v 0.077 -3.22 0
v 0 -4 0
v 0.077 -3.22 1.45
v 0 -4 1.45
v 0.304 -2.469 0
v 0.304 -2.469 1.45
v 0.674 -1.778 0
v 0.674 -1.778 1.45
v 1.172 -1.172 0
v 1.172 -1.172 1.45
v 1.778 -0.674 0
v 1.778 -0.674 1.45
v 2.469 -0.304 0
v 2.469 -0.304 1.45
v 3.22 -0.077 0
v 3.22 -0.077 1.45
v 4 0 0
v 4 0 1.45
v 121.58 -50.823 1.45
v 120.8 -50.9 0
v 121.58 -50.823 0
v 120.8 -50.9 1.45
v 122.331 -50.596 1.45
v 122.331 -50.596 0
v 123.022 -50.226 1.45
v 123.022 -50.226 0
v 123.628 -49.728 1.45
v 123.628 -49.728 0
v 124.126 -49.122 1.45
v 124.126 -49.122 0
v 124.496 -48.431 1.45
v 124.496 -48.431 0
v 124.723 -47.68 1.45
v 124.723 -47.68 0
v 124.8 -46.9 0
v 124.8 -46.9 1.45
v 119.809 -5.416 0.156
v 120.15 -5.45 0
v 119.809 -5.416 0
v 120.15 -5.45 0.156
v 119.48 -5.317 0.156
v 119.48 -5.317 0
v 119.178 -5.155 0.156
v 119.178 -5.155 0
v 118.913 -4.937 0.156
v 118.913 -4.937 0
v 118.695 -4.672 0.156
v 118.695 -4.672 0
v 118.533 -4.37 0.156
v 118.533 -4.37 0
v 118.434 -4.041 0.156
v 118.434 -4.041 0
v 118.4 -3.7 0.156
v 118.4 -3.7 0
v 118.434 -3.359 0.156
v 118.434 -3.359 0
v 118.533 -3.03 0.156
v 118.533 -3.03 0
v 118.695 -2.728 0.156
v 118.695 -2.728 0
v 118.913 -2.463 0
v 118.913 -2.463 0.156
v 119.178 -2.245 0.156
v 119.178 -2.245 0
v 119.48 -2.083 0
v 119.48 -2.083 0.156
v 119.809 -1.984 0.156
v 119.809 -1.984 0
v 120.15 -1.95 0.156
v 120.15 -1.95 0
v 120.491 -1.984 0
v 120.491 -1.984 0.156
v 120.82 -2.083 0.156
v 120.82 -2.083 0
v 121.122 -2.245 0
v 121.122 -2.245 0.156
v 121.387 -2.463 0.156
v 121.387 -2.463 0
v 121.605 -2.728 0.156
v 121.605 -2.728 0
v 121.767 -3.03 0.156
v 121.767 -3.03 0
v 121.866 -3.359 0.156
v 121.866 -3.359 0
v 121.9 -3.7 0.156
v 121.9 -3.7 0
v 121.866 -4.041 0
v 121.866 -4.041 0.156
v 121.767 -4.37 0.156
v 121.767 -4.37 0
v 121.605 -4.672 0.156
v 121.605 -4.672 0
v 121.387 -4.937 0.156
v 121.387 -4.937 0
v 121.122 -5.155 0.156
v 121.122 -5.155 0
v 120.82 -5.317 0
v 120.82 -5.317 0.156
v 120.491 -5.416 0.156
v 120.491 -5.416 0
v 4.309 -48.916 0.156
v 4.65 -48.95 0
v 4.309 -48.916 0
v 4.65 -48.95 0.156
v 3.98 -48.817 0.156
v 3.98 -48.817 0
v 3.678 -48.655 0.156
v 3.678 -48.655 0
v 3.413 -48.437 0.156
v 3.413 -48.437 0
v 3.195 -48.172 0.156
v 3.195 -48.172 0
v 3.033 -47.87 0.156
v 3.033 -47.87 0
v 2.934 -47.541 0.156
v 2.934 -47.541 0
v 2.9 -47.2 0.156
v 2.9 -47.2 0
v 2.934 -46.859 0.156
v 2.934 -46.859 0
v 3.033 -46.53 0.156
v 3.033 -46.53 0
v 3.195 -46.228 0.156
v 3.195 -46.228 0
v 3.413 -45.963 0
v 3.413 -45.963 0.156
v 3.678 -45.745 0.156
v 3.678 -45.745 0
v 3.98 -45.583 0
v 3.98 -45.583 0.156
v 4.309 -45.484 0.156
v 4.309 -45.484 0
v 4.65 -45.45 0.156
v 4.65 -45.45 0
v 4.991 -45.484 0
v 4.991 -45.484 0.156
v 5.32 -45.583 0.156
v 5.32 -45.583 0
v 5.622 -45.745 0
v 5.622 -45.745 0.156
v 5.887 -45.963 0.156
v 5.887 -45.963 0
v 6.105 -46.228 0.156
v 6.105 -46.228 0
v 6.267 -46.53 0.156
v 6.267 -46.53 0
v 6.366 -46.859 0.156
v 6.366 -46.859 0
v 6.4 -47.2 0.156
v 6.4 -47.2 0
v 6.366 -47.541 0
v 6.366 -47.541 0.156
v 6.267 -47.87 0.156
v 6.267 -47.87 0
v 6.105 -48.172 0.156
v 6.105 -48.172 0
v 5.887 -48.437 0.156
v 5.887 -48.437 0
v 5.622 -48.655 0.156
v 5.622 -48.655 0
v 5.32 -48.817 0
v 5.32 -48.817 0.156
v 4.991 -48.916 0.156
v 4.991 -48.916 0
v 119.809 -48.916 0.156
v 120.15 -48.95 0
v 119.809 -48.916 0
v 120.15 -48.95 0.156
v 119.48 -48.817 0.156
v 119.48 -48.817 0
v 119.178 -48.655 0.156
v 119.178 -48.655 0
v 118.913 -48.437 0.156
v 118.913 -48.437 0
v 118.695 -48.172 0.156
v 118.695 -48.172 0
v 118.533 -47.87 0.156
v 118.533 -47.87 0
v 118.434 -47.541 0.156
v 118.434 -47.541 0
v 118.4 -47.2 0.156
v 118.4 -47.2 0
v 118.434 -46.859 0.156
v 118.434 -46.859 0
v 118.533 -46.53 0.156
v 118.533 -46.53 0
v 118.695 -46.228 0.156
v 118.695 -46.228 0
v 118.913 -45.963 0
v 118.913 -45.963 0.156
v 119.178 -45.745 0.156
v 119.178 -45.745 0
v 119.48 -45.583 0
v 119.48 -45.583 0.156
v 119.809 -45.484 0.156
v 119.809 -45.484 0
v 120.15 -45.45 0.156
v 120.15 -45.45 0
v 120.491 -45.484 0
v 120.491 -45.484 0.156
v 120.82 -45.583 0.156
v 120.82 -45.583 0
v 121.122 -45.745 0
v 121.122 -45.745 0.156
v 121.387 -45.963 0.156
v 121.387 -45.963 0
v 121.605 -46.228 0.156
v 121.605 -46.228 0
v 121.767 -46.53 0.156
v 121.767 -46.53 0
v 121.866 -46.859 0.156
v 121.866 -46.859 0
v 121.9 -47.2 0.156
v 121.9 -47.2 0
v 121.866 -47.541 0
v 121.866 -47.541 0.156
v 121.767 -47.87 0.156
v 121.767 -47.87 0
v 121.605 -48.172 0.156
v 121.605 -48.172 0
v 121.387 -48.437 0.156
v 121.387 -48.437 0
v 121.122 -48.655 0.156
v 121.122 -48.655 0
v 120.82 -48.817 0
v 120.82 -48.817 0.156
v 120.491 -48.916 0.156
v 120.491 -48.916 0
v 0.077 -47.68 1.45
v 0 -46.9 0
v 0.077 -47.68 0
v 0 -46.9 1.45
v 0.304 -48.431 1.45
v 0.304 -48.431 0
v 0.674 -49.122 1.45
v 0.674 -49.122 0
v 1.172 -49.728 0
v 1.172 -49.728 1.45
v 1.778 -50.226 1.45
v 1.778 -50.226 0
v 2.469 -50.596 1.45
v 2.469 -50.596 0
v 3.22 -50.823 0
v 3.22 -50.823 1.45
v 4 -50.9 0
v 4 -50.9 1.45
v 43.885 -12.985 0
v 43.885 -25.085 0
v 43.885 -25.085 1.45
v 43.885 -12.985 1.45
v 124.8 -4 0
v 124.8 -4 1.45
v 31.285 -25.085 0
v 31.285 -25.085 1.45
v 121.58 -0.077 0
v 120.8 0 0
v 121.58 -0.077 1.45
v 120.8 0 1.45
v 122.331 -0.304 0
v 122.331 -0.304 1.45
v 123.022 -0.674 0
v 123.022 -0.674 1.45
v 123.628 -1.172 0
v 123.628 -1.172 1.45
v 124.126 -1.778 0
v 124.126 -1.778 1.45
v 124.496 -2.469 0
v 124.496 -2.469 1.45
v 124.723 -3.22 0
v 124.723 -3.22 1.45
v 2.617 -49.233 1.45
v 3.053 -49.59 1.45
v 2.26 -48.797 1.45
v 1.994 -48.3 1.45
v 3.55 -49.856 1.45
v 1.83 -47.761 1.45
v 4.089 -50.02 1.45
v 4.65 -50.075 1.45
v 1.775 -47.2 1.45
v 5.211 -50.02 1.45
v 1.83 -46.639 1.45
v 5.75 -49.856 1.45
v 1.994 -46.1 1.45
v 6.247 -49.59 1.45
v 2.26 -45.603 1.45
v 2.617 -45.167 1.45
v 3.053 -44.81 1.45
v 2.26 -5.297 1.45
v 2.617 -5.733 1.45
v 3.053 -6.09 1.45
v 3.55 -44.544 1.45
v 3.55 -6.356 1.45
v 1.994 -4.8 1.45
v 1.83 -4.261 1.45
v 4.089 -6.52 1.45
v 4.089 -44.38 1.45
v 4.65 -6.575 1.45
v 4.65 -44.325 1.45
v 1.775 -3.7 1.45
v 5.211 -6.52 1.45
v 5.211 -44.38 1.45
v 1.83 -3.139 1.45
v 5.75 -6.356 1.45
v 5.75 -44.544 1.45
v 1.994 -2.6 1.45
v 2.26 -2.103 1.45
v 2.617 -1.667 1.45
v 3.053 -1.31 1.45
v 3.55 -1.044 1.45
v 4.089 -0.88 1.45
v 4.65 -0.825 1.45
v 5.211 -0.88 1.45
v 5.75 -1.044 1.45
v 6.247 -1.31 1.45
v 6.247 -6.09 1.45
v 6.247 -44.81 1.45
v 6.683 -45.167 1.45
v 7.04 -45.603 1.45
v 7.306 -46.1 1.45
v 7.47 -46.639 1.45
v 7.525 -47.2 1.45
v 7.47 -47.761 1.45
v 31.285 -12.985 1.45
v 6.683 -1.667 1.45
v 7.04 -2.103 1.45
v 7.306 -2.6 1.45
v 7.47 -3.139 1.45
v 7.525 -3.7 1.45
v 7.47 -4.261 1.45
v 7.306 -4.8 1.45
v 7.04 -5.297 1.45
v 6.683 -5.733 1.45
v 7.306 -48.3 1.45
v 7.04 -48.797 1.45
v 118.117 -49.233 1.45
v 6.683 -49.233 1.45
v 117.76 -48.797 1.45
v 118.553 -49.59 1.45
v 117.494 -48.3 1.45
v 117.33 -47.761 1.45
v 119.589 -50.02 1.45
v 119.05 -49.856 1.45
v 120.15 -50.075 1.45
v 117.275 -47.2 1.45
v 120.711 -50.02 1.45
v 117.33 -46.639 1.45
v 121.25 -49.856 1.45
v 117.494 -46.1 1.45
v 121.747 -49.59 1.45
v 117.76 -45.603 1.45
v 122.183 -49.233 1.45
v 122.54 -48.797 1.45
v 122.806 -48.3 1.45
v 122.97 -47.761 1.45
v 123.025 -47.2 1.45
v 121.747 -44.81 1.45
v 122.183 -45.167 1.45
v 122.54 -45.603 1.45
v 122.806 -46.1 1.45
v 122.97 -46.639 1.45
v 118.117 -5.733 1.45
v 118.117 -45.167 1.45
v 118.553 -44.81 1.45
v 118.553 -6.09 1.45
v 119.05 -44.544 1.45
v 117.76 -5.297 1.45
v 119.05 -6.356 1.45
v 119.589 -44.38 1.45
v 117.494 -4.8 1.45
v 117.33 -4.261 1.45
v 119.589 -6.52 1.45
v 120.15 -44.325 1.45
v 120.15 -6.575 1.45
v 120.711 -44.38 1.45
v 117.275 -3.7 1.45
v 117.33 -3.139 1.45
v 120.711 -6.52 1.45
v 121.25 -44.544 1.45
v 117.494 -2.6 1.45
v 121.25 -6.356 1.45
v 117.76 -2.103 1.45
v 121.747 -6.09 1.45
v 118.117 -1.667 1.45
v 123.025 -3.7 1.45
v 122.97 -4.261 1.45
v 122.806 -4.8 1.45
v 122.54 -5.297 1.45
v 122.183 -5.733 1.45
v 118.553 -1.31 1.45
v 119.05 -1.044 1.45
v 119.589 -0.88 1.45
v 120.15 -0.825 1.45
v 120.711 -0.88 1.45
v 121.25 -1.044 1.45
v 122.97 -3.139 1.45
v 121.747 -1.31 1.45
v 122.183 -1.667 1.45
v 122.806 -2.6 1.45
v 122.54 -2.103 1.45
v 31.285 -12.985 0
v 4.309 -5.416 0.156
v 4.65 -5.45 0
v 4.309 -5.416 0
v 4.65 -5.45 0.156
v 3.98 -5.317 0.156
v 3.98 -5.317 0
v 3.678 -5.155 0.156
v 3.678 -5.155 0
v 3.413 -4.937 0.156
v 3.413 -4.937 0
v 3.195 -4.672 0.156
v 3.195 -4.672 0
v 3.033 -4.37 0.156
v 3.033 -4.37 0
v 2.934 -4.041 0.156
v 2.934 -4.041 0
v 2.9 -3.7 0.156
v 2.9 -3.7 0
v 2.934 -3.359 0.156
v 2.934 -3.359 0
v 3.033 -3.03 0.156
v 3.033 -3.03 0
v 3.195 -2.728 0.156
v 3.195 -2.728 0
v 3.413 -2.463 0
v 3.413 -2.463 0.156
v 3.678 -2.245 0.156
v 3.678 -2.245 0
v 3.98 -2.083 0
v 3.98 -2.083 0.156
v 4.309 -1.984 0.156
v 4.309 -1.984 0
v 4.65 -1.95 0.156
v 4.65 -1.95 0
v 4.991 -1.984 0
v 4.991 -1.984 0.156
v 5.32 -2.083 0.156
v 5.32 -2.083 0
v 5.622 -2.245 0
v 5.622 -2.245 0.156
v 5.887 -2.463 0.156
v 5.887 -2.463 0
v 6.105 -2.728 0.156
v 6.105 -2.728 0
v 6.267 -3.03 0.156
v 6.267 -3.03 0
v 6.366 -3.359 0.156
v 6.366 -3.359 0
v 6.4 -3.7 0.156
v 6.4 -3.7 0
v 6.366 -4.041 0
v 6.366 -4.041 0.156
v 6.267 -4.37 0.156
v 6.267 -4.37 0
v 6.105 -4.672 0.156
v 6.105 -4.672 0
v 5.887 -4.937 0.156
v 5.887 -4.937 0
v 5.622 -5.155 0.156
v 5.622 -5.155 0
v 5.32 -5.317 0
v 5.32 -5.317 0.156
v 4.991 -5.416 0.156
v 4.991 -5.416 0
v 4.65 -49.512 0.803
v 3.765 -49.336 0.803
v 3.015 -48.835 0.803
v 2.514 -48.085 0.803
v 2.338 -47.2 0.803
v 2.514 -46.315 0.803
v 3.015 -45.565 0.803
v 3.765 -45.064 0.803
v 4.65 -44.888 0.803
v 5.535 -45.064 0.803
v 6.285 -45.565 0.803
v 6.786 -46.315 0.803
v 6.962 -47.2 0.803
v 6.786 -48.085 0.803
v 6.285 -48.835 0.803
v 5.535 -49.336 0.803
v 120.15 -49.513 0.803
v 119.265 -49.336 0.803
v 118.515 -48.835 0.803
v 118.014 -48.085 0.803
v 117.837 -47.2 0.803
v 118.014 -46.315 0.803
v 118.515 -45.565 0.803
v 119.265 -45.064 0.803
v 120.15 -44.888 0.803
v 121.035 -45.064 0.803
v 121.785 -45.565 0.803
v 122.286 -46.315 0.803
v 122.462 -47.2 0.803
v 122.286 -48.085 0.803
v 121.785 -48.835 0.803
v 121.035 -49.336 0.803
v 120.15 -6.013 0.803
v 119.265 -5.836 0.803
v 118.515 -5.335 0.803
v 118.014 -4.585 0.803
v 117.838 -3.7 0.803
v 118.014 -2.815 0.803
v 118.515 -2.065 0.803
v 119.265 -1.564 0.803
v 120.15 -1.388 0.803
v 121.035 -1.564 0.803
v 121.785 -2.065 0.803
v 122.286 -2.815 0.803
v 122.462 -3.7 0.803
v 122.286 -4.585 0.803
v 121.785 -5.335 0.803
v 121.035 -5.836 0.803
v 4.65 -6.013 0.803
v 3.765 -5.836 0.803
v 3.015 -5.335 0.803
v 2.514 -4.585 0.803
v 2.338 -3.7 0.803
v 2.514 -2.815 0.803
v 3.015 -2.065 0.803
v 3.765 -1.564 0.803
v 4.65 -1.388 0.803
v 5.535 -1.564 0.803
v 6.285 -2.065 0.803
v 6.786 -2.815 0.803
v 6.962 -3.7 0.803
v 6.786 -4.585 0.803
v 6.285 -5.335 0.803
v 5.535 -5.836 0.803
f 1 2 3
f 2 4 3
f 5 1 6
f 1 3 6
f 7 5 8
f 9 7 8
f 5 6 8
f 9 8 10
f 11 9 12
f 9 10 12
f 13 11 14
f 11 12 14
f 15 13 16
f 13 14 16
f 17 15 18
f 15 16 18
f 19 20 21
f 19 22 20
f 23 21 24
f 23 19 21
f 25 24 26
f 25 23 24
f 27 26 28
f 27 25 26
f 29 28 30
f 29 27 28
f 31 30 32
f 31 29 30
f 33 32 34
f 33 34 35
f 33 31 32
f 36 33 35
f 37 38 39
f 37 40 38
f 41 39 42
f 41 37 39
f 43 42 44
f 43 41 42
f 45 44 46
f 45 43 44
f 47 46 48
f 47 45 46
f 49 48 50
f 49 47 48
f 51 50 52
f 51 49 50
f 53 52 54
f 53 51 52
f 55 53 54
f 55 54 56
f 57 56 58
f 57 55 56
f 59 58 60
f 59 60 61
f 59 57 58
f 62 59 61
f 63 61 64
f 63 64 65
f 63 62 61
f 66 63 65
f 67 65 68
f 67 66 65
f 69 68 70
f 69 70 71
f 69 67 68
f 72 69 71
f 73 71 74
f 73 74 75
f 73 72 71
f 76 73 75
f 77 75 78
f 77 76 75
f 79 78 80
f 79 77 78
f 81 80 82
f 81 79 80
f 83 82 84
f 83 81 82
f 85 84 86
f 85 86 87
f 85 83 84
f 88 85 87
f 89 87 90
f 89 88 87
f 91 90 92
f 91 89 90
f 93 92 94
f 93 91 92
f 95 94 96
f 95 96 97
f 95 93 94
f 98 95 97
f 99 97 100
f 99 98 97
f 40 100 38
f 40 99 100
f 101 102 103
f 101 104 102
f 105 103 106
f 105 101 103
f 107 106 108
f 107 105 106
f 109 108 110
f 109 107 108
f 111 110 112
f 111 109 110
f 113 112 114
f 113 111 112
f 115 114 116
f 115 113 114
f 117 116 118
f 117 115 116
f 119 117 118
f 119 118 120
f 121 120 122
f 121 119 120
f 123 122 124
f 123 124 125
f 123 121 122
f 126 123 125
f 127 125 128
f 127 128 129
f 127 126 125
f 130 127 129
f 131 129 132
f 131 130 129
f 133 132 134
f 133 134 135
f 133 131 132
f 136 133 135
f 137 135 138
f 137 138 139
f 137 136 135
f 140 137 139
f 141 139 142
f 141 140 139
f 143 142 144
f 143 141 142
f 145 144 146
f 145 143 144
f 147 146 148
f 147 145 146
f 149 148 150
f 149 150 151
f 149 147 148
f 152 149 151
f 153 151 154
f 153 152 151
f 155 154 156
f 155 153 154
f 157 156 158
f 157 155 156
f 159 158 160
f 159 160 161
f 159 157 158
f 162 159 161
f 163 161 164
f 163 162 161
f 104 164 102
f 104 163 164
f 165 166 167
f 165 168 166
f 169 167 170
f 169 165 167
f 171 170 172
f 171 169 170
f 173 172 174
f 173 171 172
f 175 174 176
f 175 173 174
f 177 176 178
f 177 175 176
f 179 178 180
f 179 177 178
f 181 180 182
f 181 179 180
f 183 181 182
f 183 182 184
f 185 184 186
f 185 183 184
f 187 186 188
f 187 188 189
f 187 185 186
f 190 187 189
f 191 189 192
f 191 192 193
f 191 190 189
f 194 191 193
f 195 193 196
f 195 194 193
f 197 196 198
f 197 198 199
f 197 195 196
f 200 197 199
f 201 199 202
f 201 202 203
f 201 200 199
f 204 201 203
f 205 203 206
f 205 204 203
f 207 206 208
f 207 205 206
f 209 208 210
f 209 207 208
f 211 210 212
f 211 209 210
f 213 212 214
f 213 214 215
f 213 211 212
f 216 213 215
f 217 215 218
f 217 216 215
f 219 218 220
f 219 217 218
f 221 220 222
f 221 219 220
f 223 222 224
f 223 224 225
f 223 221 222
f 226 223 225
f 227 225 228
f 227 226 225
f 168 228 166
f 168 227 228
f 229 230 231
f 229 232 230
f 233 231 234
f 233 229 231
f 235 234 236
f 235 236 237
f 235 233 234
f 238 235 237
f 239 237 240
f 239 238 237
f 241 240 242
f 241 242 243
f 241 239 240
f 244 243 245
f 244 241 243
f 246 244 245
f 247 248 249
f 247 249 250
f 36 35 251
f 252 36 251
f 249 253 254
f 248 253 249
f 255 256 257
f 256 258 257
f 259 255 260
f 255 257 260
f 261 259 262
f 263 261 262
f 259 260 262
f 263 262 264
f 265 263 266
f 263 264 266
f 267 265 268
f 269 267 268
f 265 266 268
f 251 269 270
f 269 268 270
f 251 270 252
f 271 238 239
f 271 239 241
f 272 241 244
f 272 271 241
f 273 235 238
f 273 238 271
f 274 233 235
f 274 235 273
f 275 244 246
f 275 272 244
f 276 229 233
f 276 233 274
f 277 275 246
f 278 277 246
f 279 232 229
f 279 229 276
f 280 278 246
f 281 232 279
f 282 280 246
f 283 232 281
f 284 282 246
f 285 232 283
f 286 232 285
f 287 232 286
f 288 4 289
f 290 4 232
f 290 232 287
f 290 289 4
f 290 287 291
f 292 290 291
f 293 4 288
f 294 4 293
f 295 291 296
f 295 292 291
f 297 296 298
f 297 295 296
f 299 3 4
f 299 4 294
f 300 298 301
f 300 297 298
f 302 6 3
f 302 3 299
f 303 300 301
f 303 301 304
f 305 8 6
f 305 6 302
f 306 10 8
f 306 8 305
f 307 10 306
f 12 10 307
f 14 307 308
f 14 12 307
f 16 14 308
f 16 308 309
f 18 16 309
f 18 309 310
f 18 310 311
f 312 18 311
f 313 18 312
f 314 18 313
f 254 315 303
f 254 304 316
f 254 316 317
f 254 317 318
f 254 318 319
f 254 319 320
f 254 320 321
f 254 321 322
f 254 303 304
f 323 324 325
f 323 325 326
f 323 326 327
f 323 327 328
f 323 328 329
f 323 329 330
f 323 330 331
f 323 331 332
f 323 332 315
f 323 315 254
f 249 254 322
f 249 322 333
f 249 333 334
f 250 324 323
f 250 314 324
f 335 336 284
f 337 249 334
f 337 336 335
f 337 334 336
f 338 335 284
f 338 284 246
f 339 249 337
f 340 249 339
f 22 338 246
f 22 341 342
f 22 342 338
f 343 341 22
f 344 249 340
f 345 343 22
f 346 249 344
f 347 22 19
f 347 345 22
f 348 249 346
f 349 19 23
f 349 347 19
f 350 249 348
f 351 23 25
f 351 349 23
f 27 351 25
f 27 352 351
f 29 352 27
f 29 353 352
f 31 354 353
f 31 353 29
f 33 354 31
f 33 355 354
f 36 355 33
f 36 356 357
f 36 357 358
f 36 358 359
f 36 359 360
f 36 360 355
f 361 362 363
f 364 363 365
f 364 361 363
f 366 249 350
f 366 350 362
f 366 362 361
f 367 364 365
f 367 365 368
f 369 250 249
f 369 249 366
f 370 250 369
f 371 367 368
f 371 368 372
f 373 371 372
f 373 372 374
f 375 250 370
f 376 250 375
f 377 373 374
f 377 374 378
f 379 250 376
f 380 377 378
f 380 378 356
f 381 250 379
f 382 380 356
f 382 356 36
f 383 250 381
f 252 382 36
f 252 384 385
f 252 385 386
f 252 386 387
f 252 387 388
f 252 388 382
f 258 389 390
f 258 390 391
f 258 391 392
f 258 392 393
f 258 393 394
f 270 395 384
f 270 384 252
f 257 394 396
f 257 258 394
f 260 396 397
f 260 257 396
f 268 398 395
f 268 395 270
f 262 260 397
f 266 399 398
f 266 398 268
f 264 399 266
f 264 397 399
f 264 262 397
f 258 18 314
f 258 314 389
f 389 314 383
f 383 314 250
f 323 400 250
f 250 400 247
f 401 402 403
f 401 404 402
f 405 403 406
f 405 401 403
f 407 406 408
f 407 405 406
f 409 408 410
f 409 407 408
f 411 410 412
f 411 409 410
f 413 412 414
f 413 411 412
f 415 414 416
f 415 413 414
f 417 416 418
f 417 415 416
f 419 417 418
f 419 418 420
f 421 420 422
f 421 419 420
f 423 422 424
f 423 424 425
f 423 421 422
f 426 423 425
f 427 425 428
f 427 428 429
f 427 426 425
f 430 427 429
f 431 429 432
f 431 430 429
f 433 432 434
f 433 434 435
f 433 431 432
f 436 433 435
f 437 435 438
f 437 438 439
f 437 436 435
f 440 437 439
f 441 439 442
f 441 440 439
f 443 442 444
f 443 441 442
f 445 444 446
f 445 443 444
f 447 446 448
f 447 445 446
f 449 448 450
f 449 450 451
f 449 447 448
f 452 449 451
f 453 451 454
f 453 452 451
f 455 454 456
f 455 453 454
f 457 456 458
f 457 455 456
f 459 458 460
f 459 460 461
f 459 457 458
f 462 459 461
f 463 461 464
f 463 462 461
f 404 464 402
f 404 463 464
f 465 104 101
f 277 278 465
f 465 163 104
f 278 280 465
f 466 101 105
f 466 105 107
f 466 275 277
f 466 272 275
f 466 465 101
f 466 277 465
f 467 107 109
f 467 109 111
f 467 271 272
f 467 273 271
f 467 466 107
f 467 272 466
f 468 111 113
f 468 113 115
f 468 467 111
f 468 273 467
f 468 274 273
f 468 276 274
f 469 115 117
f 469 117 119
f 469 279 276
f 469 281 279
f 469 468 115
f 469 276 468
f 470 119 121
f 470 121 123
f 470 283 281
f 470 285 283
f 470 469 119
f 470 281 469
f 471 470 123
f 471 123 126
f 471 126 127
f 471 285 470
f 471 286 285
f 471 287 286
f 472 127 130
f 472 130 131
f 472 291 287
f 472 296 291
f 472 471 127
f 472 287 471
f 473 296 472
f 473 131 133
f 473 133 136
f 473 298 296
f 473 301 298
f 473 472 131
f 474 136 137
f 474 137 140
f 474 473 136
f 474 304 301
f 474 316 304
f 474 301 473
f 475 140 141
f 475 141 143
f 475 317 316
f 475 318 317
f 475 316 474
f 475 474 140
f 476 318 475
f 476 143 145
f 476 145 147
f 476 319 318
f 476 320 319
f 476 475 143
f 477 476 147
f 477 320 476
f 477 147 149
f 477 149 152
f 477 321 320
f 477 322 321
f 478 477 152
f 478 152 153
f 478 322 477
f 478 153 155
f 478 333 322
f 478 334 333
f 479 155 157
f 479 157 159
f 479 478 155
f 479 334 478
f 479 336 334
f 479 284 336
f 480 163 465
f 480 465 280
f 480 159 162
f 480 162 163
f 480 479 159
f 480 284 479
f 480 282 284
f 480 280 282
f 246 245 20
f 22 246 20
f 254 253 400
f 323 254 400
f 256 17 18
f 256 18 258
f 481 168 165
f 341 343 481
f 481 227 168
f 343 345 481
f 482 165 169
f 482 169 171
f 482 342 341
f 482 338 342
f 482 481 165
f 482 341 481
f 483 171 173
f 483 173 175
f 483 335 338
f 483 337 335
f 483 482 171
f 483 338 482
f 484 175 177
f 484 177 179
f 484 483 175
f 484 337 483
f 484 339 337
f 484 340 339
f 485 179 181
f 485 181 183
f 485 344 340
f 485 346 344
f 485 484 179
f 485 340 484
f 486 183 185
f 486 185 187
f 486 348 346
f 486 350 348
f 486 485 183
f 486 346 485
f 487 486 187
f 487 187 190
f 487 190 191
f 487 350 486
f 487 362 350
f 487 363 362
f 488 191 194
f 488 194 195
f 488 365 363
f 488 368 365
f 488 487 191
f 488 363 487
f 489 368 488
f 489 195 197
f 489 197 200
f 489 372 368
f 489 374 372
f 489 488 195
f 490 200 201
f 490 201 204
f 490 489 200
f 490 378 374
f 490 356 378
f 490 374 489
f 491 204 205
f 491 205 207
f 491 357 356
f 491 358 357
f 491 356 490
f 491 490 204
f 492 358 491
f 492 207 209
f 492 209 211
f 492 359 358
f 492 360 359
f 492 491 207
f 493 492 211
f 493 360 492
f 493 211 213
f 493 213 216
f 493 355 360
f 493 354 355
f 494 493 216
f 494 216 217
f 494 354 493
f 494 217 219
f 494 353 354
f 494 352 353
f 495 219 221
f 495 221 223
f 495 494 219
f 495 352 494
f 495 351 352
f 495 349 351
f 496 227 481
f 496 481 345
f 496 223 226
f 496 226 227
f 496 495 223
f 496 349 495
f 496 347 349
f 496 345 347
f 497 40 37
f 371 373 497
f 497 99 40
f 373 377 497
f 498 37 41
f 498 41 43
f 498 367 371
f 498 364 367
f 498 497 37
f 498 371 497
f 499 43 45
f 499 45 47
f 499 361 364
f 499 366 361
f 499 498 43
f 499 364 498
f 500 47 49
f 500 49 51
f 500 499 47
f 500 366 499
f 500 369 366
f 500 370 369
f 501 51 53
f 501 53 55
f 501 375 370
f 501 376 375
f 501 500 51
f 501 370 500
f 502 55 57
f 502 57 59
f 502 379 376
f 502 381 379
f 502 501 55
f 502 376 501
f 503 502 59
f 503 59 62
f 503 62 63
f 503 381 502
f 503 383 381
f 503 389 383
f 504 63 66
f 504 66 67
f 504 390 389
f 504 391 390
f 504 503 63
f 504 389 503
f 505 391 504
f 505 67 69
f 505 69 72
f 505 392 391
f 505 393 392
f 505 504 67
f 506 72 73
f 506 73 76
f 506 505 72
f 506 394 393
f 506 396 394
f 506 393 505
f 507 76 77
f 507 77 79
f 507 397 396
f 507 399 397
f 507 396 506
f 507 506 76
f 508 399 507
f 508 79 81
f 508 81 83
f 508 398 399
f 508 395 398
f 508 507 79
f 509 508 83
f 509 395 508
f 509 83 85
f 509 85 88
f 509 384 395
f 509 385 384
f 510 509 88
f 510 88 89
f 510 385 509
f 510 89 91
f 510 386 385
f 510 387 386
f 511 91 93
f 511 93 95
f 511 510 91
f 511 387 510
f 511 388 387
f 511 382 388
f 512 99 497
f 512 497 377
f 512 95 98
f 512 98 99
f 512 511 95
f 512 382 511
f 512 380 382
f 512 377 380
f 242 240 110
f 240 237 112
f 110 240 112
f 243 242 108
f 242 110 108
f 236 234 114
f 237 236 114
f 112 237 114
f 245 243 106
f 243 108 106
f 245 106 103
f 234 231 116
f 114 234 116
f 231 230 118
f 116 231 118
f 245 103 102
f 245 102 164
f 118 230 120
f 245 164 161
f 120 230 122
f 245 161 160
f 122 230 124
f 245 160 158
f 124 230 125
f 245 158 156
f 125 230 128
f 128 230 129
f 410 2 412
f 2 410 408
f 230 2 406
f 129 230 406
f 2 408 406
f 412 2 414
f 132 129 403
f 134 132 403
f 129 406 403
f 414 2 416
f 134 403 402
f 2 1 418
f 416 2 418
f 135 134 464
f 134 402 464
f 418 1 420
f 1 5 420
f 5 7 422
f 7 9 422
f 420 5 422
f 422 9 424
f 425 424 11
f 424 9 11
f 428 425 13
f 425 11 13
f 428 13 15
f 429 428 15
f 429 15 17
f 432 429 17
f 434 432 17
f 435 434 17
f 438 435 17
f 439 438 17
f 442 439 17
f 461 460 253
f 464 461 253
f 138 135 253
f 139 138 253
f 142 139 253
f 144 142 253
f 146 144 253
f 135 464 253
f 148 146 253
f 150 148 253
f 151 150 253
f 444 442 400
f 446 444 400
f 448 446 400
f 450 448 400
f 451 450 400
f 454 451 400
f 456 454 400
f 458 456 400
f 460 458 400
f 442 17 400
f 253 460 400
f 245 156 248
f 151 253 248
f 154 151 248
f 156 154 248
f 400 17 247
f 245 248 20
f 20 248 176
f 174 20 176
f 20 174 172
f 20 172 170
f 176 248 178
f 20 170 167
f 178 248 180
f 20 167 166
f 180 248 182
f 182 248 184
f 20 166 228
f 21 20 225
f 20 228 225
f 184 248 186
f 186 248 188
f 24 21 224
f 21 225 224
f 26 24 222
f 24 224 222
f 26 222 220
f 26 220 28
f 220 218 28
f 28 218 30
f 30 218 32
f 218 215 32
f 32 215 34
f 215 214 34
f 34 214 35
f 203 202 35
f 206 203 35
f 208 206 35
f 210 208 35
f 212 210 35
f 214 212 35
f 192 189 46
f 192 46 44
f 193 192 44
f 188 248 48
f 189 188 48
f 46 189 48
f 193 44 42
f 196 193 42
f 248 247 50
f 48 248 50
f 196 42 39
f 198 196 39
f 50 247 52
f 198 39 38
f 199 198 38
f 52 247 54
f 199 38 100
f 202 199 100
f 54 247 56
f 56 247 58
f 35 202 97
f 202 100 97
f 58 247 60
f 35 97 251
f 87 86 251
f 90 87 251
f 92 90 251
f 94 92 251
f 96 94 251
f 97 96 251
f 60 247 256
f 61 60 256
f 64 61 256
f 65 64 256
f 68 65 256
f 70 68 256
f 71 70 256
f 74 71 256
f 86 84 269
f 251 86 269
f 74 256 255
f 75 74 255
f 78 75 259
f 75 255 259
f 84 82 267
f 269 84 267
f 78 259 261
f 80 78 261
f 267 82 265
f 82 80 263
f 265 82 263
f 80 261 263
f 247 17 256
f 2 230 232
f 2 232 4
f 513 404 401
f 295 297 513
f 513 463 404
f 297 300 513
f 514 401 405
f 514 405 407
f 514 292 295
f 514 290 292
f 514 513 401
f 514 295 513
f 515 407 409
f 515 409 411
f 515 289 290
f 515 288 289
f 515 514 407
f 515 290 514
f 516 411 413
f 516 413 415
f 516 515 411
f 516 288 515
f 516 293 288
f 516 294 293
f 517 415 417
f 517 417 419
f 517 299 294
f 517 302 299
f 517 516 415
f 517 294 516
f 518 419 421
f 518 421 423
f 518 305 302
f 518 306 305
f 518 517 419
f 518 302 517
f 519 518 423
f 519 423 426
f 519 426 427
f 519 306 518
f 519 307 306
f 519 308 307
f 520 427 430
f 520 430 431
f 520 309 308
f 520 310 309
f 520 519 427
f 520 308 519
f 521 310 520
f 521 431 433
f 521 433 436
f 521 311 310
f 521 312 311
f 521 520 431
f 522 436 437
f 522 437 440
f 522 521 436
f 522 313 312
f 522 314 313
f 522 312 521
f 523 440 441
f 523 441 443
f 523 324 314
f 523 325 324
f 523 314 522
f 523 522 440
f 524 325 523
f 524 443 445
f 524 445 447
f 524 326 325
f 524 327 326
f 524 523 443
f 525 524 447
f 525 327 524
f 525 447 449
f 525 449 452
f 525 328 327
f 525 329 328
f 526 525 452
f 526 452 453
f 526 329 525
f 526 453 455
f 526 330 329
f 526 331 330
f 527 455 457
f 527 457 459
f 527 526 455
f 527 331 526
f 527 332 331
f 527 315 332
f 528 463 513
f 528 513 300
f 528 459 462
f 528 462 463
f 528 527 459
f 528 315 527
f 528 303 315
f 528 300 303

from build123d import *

# Parameters (mm, degrees)
SKETCH1_W                                      = 124.8
SKETCH1_H                                      = 50.9
SKETCH1_W_2                                    = 12.6
SKETCH1_H_2                                    = 12.1
BOSS_EXTRUDE1_DEPTH                            = 1.45
CSK_FOR_M3_5_FLAT_HEAD_MACHINE_SCREW1_AT_COUNT = 2
CSK_FOR_M3_5_FLAT_HEAD_MACHINE_SCREW1_AT_PITCH = 115.5
CSK_FOR_M3_5_FLAT_HEAD_MACHINE_SCREW_2_COUNT   = 2
CSK_FOR_M3_5_FLAT_HEAD_MACHINE_SCREW_2_PITCH   = 123.420014584
CSK_FOR_M3_5_FLAT_HEAD_MACHINE_SCREW_3_COUNT   = 2
CSK_FOR_M3_5_FLAT_HEAD_MACHINE_SCREW_3_PITCH   = 43.5
FILLET2_R                                      = 4


with BuildPart() as part:
    # Sketch1 → Boss-Extrude1 (new body)
    with BuildSketch(Plane.XY):
        with Locations((62.4, -25.45)):
            Rectangle(SKETCH1_W, SKETCH1_H)
        with Locations((37.585, -19.035)):
            Rectangle(SKETCH1_W_2, SKETCH1_H_2, mode=Mode.SUBTRACT)
    extrude(amount=BOSS_EXTRUDE1_DEPTH)

    # Sketch2 → CSK for M3.5 Flat Head Machine Screw1 (revolve, cut)
    with BuildSketch(Plane(origin=(4.65, -3.7, 1.45), x_dir=(0, -1, 0), z_dir=(1, 0, 0))):
        Polygon((0, 0), (0, 1.45), (1.75, 1.45), (1.75, 1.294164458), (2.875, 0), align=None)
    csk_for_m3_5_flat_head_machine_screw1 = revolve(axis=Axis((4.65, -3.7, 7.8), (0, 0, -1)), mode=Mode.SUBTRACT)

    # CSK for M3.5 Flat Head Machine Screw1 at: CSK for M3.5 Flat Head Machine Screw1 ×2
    with Locations(*[(i * CSK_FOR_M3_5_FLAT_HEAD_MACHINE_SCREW1_AT_PITCH, 0, 0) for i in range(1, CSK_FOR_M3_5_FLAT_HEAD_MACHINE_SCREW1_AT_COUNT)]):
        add(csk_for_m3_5_flat_head_machine_screw1, mode=Mode.SUBTRACT)

    # CSK for M3.5 Flat Head Machine Screw 2: CSK for M3.5 Flat Head Machine Screw1 ×2
    with Locations(*[Vector(0.935828766, -0.35245499, 0) * (i * CSK_FOR_M3_5_FLAT_HEAD_MACHINE_SCREW_2_PITCH) for i in range(1, CSK_FOR_M3_5_FLAT_HEAD_MACHINE_SCREW_2_COUNT)]):
        add(csk_for_m3_5_flat_head_machine_screw1, mode=Mode.SUBTRACT)

    # CSK for M3.5 Flat Head Machine Screw 3: CSK for M3.5 Flat Head Machine Screw1 ×2
    with Locations(*[(0, -i * CSK_FOR_M3_5_FLAT_HEAD_MACHINE_SCREW_3_PITCH, 0) for i in range(1, CSK_FOR_M3_5_FLAT_HEAD_MACHINE_SCREW_3_COUNT)]):
        add(csk_for_m3_5_flat_head_machine_screw1, mode=Mode.SUBTRACT)

    # Fillet2
    fillet2_edges = [part.edges().sort_by_distance(p)[0] for p in [
        (124.8, -50.9, 0.725),
        (0, -50.9, 0.725),
        (0, 0, 0.725),
        (124.8, 0, 0.725),
    ]]
    fillet(fillet2_edges, radius=FILLET2_R)


solid = part.part
